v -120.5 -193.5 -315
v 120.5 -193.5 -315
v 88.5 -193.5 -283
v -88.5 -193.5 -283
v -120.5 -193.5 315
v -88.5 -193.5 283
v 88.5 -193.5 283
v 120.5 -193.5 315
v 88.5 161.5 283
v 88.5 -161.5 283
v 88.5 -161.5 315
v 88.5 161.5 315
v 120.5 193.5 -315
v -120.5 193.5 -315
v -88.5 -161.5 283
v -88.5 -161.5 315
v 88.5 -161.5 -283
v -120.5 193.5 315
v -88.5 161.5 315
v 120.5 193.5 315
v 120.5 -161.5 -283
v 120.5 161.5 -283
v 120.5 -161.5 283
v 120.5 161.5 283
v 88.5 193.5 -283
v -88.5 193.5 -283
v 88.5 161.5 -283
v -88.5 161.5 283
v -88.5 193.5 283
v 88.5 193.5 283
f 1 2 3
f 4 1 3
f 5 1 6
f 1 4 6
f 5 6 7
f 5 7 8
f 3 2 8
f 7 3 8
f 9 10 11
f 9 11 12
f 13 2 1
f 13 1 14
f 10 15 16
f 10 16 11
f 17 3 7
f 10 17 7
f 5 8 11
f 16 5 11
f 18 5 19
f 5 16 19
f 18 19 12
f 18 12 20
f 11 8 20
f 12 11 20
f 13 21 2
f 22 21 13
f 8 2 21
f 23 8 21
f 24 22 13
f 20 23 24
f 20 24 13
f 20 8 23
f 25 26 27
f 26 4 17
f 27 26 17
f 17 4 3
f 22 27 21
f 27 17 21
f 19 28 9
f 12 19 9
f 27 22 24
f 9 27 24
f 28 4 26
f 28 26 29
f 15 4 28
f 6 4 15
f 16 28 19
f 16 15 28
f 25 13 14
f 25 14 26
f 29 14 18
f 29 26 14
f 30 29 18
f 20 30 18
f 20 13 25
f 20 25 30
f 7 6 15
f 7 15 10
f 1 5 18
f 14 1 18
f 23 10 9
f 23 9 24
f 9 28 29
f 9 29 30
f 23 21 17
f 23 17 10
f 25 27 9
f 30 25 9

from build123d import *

# Parameters (mm, degrees)
F0_W     = 387
F0_H     = 630
F1_DEPTH = 120.5
F3_W     = 177
F3_H     = 323
F5_DEPTH = 145.5
F2_W     = 323
F2_H     = 566
F6_DEPTH = 193
F4_W     = 177
F4_H     = 566
F7_DEPTH = 211
F8_W     = 177
F8_H     = 323
F9_DEPTH = 315.001


with BuildPart() as f1:
    # F0 (on Right) → F1 (new body, symmetric)
    with BuildSketch(Plane.YZ):
        Rectangle(F0_W, F0_H)
    extrude(amount=F1_DEPTH, both=True)


with BuildPart() as f5:
    # F3 (on Top) → F5 (new body, symmetric)
    with BuildSketch(Plane.XY):
        Rectangle(F3_W, F3_H)
    extrude(amount=F5_DEPTH, both=True)


with BuildPart() as f6_tool:
    # F2 (on face) → F6 (new body)
    with BuildSketch(Plane.YZ.offset(120.5)):
        Rectangle(F2_W, F2_H)
    extrude(amount=-F6_DEPTH)


with BuildPart() as f1_1:
    add(f1.part)

    # F6: cut by f6_tool
    add(f6_tool.part, mode=Mode.SUBTRACT)


with BuildPart() as f5_1:
    add(f5.part)

    # F6: cut by f6_tool
    add(f6_tool.part, mode=Mode.SUBTRACT)


with BuildPart() as f7_tool:
    # F4 (on Front) → F7 (new body, symmetric)
    with BuildSketch(Plane.XZ):
        Rectangle(F4_W, F4_H)
    extrude(amount=F7_DEPTH, both=True)


with BuildPart() as f1_2:
    add(f1_1.part)

    # F7: cut by f7_tool
    add(f7_tool.part, mode=Mode.SUBTRACT)

    # F8 (on Top) → F9 (cut, through all)
    with BuildSketch(Plane.XY):
        Rectangle(F8_W, F8_H)
    extrude(amount=F9_DEPTH, mode=Mode.SUBTRACT)


with BuildPart() as f5_2:
    add(f5_1.part)

    # F7: cut by f7_tool
    add(f7_tool.part, mode=Mode.SUBTRACT)


solid = f1_2.part
